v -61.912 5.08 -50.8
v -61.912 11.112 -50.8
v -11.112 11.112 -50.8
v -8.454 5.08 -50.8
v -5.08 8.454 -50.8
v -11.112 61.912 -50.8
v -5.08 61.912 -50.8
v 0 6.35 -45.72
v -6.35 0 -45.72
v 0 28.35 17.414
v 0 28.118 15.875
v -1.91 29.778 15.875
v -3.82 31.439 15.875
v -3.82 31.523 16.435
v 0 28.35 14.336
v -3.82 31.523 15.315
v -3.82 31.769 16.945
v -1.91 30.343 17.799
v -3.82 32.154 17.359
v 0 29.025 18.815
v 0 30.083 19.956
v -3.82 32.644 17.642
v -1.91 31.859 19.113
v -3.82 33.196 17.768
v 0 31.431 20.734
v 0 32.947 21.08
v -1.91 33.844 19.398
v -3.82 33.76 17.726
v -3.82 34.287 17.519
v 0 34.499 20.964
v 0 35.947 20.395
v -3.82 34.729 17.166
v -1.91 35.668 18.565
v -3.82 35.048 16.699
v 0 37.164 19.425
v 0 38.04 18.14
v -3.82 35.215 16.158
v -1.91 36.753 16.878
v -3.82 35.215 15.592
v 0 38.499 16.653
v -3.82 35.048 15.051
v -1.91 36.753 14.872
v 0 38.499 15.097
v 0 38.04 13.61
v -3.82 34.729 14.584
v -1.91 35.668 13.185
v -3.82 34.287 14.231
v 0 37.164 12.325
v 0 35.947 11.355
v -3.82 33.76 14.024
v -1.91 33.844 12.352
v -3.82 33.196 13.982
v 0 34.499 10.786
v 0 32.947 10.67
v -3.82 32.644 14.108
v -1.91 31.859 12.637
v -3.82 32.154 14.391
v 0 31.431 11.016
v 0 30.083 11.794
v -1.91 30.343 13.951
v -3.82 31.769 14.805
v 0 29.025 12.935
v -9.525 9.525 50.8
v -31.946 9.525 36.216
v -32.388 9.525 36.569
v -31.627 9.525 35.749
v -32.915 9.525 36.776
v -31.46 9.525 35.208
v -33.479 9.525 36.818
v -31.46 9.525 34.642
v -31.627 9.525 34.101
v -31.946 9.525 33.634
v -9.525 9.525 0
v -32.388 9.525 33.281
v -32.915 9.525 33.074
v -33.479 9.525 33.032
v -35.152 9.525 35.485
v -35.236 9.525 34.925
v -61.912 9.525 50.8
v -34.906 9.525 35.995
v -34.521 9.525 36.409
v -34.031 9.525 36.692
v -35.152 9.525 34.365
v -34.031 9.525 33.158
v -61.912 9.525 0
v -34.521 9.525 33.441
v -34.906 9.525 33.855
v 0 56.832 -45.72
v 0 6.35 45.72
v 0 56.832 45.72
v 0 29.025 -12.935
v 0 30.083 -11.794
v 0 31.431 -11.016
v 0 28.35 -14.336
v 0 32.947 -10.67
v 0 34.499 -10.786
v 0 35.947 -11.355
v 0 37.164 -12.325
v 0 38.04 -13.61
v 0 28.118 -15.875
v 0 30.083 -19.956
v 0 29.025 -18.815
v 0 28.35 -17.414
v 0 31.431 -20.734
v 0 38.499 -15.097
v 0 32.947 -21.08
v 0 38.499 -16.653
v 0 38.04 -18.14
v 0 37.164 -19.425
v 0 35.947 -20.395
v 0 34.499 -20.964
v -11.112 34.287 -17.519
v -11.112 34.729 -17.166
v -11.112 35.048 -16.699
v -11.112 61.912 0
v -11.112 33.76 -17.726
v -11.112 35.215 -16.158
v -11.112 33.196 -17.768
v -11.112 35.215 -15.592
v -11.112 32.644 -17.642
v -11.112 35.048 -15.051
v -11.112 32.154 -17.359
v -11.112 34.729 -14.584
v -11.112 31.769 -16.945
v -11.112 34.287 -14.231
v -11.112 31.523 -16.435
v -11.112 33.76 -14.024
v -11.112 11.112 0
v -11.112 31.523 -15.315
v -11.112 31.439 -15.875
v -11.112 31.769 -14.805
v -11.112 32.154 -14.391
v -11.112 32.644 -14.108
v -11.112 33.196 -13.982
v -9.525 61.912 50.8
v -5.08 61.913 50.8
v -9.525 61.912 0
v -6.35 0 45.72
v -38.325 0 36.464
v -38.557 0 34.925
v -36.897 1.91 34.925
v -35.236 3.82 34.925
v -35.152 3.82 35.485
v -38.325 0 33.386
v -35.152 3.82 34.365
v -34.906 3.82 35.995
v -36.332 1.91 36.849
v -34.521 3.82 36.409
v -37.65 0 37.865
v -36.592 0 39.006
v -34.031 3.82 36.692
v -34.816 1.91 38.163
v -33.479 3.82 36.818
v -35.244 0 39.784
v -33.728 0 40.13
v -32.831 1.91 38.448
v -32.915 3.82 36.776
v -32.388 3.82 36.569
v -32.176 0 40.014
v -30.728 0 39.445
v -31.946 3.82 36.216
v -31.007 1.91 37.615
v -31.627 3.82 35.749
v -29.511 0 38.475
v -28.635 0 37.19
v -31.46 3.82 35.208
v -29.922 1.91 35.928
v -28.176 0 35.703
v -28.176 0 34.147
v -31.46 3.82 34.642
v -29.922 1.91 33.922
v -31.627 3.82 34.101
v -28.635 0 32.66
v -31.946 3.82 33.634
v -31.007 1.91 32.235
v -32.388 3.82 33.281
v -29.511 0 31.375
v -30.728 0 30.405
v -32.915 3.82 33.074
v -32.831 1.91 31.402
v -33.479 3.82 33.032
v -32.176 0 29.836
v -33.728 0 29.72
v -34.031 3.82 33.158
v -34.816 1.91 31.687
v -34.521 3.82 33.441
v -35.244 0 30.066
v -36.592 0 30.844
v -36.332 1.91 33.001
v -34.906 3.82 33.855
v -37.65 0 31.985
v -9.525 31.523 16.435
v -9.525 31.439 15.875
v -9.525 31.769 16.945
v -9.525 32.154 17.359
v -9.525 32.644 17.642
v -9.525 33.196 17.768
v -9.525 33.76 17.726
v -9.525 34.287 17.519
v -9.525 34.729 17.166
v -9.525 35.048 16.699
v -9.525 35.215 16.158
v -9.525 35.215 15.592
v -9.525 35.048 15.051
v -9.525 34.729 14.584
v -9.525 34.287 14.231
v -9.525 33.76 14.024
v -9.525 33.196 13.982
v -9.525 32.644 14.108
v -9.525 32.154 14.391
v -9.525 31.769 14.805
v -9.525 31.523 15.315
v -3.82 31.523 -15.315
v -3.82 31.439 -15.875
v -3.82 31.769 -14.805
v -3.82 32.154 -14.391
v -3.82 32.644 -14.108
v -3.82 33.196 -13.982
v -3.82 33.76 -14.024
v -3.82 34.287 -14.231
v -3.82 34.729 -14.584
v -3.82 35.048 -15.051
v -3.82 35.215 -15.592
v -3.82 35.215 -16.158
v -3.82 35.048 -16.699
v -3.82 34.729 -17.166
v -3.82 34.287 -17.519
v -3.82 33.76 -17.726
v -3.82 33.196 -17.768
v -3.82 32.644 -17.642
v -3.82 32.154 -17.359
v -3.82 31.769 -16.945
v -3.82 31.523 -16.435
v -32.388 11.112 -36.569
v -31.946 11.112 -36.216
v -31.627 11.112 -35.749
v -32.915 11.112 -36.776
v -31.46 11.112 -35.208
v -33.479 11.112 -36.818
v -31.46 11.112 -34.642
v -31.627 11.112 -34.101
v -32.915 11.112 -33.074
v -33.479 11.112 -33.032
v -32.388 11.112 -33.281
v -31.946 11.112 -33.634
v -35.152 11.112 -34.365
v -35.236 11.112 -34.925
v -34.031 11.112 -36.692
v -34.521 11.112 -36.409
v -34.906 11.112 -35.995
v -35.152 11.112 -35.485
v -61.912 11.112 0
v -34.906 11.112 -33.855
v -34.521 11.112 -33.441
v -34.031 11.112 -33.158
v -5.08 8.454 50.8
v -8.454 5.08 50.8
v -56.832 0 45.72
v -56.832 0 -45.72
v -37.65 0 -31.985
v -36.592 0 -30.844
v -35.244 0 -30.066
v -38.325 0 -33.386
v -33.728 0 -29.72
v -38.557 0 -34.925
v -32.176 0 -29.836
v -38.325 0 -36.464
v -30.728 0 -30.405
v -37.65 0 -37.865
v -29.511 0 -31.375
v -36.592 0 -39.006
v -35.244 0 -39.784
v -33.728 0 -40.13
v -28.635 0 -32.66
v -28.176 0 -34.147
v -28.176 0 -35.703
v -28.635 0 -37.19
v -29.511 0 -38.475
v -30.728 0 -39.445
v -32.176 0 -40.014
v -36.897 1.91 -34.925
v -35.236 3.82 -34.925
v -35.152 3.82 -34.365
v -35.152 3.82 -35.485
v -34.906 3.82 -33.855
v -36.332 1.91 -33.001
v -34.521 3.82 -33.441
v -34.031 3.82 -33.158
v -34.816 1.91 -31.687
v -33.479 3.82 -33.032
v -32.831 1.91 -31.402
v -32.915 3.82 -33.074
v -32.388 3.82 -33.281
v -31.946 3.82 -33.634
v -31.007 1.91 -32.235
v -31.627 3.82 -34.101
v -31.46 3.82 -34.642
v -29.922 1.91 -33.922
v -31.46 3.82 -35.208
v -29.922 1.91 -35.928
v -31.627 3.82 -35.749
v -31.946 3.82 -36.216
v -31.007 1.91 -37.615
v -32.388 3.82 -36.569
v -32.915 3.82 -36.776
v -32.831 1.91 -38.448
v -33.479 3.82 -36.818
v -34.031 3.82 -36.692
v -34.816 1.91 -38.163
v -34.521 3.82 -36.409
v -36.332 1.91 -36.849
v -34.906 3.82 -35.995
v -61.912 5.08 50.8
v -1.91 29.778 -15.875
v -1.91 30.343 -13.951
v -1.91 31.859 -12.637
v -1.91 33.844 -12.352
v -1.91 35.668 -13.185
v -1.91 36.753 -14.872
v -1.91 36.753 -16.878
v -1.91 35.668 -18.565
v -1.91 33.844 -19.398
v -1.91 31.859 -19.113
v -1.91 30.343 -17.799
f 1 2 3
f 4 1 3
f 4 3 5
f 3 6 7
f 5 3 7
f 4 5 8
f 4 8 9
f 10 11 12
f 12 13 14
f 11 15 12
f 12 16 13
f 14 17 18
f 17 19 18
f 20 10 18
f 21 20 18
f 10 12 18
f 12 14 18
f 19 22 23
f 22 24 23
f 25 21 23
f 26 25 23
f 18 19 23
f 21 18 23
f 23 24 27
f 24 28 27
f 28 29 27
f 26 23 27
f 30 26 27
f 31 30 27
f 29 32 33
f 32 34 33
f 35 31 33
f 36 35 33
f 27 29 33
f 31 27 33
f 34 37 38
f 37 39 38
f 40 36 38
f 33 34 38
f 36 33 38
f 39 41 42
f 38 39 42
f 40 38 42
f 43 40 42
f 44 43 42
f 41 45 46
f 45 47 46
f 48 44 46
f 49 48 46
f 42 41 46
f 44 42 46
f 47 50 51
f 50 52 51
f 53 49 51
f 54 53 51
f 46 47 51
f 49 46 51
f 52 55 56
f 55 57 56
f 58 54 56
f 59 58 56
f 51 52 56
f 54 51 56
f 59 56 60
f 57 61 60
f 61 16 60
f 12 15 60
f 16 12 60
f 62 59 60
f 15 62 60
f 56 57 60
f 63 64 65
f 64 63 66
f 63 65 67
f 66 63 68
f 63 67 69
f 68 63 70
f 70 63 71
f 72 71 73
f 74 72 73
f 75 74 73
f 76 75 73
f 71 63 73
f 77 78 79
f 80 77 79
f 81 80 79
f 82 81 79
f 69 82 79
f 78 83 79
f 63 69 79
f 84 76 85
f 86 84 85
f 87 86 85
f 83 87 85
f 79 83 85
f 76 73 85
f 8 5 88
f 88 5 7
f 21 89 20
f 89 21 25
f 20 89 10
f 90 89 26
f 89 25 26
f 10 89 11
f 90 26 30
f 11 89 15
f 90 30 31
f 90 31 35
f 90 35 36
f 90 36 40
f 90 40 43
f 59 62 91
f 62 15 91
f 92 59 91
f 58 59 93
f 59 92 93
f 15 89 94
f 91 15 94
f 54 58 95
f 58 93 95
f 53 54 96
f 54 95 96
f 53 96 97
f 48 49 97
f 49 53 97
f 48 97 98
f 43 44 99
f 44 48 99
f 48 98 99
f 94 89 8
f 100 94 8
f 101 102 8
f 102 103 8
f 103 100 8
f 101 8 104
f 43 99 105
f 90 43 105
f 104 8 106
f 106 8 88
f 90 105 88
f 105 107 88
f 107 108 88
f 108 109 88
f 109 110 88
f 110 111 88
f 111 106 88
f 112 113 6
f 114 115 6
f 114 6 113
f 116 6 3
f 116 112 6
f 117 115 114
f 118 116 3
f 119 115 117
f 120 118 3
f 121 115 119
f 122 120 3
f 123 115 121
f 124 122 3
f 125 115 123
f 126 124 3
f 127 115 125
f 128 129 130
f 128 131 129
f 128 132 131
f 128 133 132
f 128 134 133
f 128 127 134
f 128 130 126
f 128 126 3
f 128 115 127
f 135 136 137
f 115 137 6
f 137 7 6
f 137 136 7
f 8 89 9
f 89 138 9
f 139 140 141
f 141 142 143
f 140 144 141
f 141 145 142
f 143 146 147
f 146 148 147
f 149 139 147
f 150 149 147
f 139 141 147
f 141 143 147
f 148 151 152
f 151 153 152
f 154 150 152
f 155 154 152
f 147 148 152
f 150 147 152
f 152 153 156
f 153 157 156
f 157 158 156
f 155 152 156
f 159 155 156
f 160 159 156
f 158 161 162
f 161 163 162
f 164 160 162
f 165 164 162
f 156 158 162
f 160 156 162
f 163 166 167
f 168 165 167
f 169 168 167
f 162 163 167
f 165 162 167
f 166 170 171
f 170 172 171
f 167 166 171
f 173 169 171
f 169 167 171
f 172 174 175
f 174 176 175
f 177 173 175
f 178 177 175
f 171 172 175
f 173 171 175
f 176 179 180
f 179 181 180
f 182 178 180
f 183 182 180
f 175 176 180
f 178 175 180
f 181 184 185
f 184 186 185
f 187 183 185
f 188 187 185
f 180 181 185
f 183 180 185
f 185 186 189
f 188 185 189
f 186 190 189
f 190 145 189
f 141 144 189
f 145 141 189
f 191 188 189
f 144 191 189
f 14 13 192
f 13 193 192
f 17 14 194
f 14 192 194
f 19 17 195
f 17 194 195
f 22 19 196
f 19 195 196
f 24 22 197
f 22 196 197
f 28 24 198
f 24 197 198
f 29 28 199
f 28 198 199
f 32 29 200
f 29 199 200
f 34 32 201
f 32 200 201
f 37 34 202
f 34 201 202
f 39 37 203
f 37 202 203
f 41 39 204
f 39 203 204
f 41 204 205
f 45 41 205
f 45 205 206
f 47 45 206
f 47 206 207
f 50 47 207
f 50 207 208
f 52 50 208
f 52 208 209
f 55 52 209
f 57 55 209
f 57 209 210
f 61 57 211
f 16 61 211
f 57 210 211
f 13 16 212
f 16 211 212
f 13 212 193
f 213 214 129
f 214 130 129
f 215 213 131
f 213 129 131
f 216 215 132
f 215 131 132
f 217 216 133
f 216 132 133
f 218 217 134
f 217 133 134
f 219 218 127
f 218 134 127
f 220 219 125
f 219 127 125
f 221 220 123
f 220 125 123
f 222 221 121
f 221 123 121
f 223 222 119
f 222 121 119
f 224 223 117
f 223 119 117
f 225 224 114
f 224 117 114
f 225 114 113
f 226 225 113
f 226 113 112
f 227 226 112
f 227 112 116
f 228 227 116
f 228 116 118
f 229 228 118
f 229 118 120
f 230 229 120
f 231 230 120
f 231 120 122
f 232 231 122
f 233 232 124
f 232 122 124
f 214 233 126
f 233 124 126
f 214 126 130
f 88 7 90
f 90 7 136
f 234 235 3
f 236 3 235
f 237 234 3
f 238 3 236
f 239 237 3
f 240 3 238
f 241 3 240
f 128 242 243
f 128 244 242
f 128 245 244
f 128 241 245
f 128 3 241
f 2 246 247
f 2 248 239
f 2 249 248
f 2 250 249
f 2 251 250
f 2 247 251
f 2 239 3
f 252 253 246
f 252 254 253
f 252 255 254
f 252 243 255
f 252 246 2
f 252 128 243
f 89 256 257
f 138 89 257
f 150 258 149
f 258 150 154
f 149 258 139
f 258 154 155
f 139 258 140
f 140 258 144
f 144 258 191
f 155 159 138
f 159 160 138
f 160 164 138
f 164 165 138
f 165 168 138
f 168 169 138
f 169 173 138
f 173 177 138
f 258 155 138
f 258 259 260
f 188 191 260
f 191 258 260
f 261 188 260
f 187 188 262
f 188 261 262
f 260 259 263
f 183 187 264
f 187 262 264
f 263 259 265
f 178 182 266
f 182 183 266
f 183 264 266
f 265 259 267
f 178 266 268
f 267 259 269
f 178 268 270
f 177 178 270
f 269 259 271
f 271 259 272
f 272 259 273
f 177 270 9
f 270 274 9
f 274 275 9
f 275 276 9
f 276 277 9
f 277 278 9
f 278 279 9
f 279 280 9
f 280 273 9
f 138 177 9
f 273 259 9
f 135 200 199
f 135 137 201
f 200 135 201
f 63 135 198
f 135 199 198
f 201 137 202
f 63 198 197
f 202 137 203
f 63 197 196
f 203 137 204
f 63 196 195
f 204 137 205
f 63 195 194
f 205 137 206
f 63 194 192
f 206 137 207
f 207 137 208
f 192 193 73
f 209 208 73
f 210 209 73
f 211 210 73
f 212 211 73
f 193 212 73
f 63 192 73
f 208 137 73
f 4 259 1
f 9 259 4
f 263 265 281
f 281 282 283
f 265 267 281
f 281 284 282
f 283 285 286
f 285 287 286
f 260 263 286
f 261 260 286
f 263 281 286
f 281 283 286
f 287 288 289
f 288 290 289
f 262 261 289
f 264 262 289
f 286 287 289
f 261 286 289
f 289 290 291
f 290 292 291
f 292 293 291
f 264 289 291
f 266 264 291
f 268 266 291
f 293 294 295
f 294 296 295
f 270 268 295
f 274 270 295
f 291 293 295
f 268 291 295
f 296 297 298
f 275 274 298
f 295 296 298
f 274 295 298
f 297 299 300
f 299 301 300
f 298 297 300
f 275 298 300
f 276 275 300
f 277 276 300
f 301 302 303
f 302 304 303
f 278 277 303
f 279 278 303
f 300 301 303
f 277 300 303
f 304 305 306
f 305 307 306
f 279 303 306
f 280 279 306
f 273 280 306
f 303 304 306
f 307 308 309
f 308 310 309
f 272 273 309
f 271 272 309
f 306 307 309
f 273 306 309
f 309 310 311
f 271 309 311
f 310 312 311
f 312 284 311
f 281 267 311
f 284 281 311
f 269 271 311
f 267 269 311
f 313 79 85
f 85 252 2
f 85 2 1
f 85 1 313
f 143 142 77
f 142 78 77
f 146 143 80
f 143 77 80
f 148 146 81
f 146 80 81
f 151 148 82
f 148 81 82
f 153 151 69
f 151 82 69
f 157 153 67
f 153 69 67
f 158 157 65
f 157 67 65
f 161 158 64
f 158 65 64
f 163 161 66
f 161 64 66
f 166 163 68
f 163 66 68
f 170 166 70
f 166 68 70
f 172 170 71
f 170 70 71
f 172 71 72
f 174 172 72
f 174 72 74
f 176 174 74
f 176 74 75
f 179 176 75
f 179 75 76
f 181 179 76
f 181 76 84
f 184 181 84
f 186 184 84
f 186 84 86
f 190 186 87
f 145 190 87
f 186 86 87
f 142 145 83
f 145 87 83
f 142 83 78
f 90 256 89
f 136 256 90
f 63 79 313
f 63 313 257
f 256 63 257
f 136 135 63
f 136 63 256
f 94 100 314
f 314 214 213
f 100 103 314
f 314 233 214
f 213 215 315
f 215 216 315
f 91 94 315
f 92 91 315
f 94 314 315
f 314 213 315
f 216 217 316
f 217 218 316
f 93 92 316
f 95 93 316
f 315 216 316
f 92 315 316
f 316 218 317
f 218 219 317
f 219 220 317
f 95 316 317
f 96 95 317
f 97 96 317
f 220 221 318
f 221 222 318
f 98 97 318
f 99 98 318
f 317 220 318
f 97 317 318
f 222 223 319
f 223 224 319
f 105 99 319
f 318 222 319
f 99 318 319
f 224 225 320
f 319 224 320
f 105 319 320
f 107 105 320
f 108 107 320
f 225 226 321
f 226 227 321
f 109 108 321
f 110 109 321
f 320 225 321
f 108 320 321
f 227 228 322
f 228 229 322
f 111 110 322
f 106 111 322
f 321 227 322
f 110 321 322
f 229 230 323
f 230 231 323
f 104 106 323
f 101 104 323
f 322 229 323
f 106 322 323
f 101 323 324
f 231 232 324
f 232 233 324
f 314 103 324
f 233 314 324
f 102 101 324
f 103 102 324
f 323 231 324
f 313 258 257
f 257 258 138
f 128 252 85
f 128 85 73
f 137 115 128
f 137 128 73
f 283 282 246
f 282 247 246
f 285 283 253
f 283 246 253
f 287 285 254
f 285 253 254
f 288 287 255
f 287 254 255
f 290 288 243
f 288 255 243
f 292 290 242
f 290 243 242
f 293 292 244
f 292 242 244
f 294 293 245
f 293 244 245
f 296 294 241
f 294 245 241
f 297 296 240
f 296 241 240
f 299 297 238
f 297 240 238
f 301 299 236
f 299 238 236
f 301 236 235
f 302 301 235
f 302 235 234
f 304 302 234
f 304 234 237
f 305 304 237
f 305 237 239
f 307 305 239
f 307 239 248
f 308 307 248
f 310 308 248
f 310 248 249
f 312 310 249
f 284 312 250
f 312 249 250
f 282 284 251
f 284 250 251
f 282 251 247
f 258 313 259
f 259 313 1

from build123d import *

# Parameters (mm, degrees)
F1_DEPTH             = 50.8
F3_DEPTH             = 50.8
F6_D                 = 3.7973
F6_CSINK_D           = 10.4394
F6_CSINK_ANGLE       = 82
F6_ON_F5_D           = 3.7973
F6_ON_F5_CSINK_D     = 10.4394
F6_ON_F5_CSINK_ANGLE = 82
F7_SIZE              = 6.35
F9_SIZE              = 5.08


# Not quite as in the source:
# - a feature of the source that left no trace in its solid (it failed there, or was rolled back) is left out
# - a feature names something its author has since deleted; it is built from what else it names


with BuildPart() as f1:
    # F0 (on Top) → F1 (new body)
    with BuildSketch(Plane.XY):
        Polygon((-61.9125, 0), (0, 0), (0, 61.9125), (-11.1125, 61.9125), (-11.1125, 11.1125), (-61.9125, 11.1125), align=None)
    extrude(amount=-F1_DEPTH)

    # F2 (on face) → F3 (join)
    with BuildSketch(Plane.XY):
        Polygon((0, 0), (0, 61.9125), (-9.525, 61.9125), (-9.525, 9.525), (-61.9125, 9.525), (-61.9125, 0), align=None)
    extrude(amount=F3_DEPTH)

    # F6 (through all)
    with Locations(Plane.YZ):
        with Locations((33.3375, -15.875), (33.3375, 15.875)):
            CounterSinkHole(F6_D / 2, F6_CSINK_D / 2, counter_sink_angle=F6_CSINK_ANGLE)

    # F6 on F5 (through all)
    with Locations(Plane.XZ):
        with Locations((-33.3375, 34.925), (-33.3375, -34.925)):
            CounterSinkHole(F6_ON_F5_D / 2, F6_ON_F5_CSINK_D / 2, counter_sink_angle=F6_ON_F5_CSINK_ANGLE)

    # F7
    f7_edges = [f1.edges().sort_by_distance(p)[0] for p in [
        (0, 0, 0),
    ]]
    chamfer(f7_edges, length=F7_SIZE)

    # F9
    f9_edges = [f1.edges().sort_by_distance(p)[0] for p in [
        (-34.13125, 0, 50.8),
        (-3.175, 3.175, 50.8),
        (0, 34.13125, 50.8),
        (-3.175, 3.175, -50.8),
        (-34.13125, 0, -50.8),
        (0, 34.13125, -50.8),
        (-61.9125, 0, 0),
        (0, 61.9125, 0),
    ]]
    chamfer(f9_edges, length=F9_SIZE)


solid = f1.part
